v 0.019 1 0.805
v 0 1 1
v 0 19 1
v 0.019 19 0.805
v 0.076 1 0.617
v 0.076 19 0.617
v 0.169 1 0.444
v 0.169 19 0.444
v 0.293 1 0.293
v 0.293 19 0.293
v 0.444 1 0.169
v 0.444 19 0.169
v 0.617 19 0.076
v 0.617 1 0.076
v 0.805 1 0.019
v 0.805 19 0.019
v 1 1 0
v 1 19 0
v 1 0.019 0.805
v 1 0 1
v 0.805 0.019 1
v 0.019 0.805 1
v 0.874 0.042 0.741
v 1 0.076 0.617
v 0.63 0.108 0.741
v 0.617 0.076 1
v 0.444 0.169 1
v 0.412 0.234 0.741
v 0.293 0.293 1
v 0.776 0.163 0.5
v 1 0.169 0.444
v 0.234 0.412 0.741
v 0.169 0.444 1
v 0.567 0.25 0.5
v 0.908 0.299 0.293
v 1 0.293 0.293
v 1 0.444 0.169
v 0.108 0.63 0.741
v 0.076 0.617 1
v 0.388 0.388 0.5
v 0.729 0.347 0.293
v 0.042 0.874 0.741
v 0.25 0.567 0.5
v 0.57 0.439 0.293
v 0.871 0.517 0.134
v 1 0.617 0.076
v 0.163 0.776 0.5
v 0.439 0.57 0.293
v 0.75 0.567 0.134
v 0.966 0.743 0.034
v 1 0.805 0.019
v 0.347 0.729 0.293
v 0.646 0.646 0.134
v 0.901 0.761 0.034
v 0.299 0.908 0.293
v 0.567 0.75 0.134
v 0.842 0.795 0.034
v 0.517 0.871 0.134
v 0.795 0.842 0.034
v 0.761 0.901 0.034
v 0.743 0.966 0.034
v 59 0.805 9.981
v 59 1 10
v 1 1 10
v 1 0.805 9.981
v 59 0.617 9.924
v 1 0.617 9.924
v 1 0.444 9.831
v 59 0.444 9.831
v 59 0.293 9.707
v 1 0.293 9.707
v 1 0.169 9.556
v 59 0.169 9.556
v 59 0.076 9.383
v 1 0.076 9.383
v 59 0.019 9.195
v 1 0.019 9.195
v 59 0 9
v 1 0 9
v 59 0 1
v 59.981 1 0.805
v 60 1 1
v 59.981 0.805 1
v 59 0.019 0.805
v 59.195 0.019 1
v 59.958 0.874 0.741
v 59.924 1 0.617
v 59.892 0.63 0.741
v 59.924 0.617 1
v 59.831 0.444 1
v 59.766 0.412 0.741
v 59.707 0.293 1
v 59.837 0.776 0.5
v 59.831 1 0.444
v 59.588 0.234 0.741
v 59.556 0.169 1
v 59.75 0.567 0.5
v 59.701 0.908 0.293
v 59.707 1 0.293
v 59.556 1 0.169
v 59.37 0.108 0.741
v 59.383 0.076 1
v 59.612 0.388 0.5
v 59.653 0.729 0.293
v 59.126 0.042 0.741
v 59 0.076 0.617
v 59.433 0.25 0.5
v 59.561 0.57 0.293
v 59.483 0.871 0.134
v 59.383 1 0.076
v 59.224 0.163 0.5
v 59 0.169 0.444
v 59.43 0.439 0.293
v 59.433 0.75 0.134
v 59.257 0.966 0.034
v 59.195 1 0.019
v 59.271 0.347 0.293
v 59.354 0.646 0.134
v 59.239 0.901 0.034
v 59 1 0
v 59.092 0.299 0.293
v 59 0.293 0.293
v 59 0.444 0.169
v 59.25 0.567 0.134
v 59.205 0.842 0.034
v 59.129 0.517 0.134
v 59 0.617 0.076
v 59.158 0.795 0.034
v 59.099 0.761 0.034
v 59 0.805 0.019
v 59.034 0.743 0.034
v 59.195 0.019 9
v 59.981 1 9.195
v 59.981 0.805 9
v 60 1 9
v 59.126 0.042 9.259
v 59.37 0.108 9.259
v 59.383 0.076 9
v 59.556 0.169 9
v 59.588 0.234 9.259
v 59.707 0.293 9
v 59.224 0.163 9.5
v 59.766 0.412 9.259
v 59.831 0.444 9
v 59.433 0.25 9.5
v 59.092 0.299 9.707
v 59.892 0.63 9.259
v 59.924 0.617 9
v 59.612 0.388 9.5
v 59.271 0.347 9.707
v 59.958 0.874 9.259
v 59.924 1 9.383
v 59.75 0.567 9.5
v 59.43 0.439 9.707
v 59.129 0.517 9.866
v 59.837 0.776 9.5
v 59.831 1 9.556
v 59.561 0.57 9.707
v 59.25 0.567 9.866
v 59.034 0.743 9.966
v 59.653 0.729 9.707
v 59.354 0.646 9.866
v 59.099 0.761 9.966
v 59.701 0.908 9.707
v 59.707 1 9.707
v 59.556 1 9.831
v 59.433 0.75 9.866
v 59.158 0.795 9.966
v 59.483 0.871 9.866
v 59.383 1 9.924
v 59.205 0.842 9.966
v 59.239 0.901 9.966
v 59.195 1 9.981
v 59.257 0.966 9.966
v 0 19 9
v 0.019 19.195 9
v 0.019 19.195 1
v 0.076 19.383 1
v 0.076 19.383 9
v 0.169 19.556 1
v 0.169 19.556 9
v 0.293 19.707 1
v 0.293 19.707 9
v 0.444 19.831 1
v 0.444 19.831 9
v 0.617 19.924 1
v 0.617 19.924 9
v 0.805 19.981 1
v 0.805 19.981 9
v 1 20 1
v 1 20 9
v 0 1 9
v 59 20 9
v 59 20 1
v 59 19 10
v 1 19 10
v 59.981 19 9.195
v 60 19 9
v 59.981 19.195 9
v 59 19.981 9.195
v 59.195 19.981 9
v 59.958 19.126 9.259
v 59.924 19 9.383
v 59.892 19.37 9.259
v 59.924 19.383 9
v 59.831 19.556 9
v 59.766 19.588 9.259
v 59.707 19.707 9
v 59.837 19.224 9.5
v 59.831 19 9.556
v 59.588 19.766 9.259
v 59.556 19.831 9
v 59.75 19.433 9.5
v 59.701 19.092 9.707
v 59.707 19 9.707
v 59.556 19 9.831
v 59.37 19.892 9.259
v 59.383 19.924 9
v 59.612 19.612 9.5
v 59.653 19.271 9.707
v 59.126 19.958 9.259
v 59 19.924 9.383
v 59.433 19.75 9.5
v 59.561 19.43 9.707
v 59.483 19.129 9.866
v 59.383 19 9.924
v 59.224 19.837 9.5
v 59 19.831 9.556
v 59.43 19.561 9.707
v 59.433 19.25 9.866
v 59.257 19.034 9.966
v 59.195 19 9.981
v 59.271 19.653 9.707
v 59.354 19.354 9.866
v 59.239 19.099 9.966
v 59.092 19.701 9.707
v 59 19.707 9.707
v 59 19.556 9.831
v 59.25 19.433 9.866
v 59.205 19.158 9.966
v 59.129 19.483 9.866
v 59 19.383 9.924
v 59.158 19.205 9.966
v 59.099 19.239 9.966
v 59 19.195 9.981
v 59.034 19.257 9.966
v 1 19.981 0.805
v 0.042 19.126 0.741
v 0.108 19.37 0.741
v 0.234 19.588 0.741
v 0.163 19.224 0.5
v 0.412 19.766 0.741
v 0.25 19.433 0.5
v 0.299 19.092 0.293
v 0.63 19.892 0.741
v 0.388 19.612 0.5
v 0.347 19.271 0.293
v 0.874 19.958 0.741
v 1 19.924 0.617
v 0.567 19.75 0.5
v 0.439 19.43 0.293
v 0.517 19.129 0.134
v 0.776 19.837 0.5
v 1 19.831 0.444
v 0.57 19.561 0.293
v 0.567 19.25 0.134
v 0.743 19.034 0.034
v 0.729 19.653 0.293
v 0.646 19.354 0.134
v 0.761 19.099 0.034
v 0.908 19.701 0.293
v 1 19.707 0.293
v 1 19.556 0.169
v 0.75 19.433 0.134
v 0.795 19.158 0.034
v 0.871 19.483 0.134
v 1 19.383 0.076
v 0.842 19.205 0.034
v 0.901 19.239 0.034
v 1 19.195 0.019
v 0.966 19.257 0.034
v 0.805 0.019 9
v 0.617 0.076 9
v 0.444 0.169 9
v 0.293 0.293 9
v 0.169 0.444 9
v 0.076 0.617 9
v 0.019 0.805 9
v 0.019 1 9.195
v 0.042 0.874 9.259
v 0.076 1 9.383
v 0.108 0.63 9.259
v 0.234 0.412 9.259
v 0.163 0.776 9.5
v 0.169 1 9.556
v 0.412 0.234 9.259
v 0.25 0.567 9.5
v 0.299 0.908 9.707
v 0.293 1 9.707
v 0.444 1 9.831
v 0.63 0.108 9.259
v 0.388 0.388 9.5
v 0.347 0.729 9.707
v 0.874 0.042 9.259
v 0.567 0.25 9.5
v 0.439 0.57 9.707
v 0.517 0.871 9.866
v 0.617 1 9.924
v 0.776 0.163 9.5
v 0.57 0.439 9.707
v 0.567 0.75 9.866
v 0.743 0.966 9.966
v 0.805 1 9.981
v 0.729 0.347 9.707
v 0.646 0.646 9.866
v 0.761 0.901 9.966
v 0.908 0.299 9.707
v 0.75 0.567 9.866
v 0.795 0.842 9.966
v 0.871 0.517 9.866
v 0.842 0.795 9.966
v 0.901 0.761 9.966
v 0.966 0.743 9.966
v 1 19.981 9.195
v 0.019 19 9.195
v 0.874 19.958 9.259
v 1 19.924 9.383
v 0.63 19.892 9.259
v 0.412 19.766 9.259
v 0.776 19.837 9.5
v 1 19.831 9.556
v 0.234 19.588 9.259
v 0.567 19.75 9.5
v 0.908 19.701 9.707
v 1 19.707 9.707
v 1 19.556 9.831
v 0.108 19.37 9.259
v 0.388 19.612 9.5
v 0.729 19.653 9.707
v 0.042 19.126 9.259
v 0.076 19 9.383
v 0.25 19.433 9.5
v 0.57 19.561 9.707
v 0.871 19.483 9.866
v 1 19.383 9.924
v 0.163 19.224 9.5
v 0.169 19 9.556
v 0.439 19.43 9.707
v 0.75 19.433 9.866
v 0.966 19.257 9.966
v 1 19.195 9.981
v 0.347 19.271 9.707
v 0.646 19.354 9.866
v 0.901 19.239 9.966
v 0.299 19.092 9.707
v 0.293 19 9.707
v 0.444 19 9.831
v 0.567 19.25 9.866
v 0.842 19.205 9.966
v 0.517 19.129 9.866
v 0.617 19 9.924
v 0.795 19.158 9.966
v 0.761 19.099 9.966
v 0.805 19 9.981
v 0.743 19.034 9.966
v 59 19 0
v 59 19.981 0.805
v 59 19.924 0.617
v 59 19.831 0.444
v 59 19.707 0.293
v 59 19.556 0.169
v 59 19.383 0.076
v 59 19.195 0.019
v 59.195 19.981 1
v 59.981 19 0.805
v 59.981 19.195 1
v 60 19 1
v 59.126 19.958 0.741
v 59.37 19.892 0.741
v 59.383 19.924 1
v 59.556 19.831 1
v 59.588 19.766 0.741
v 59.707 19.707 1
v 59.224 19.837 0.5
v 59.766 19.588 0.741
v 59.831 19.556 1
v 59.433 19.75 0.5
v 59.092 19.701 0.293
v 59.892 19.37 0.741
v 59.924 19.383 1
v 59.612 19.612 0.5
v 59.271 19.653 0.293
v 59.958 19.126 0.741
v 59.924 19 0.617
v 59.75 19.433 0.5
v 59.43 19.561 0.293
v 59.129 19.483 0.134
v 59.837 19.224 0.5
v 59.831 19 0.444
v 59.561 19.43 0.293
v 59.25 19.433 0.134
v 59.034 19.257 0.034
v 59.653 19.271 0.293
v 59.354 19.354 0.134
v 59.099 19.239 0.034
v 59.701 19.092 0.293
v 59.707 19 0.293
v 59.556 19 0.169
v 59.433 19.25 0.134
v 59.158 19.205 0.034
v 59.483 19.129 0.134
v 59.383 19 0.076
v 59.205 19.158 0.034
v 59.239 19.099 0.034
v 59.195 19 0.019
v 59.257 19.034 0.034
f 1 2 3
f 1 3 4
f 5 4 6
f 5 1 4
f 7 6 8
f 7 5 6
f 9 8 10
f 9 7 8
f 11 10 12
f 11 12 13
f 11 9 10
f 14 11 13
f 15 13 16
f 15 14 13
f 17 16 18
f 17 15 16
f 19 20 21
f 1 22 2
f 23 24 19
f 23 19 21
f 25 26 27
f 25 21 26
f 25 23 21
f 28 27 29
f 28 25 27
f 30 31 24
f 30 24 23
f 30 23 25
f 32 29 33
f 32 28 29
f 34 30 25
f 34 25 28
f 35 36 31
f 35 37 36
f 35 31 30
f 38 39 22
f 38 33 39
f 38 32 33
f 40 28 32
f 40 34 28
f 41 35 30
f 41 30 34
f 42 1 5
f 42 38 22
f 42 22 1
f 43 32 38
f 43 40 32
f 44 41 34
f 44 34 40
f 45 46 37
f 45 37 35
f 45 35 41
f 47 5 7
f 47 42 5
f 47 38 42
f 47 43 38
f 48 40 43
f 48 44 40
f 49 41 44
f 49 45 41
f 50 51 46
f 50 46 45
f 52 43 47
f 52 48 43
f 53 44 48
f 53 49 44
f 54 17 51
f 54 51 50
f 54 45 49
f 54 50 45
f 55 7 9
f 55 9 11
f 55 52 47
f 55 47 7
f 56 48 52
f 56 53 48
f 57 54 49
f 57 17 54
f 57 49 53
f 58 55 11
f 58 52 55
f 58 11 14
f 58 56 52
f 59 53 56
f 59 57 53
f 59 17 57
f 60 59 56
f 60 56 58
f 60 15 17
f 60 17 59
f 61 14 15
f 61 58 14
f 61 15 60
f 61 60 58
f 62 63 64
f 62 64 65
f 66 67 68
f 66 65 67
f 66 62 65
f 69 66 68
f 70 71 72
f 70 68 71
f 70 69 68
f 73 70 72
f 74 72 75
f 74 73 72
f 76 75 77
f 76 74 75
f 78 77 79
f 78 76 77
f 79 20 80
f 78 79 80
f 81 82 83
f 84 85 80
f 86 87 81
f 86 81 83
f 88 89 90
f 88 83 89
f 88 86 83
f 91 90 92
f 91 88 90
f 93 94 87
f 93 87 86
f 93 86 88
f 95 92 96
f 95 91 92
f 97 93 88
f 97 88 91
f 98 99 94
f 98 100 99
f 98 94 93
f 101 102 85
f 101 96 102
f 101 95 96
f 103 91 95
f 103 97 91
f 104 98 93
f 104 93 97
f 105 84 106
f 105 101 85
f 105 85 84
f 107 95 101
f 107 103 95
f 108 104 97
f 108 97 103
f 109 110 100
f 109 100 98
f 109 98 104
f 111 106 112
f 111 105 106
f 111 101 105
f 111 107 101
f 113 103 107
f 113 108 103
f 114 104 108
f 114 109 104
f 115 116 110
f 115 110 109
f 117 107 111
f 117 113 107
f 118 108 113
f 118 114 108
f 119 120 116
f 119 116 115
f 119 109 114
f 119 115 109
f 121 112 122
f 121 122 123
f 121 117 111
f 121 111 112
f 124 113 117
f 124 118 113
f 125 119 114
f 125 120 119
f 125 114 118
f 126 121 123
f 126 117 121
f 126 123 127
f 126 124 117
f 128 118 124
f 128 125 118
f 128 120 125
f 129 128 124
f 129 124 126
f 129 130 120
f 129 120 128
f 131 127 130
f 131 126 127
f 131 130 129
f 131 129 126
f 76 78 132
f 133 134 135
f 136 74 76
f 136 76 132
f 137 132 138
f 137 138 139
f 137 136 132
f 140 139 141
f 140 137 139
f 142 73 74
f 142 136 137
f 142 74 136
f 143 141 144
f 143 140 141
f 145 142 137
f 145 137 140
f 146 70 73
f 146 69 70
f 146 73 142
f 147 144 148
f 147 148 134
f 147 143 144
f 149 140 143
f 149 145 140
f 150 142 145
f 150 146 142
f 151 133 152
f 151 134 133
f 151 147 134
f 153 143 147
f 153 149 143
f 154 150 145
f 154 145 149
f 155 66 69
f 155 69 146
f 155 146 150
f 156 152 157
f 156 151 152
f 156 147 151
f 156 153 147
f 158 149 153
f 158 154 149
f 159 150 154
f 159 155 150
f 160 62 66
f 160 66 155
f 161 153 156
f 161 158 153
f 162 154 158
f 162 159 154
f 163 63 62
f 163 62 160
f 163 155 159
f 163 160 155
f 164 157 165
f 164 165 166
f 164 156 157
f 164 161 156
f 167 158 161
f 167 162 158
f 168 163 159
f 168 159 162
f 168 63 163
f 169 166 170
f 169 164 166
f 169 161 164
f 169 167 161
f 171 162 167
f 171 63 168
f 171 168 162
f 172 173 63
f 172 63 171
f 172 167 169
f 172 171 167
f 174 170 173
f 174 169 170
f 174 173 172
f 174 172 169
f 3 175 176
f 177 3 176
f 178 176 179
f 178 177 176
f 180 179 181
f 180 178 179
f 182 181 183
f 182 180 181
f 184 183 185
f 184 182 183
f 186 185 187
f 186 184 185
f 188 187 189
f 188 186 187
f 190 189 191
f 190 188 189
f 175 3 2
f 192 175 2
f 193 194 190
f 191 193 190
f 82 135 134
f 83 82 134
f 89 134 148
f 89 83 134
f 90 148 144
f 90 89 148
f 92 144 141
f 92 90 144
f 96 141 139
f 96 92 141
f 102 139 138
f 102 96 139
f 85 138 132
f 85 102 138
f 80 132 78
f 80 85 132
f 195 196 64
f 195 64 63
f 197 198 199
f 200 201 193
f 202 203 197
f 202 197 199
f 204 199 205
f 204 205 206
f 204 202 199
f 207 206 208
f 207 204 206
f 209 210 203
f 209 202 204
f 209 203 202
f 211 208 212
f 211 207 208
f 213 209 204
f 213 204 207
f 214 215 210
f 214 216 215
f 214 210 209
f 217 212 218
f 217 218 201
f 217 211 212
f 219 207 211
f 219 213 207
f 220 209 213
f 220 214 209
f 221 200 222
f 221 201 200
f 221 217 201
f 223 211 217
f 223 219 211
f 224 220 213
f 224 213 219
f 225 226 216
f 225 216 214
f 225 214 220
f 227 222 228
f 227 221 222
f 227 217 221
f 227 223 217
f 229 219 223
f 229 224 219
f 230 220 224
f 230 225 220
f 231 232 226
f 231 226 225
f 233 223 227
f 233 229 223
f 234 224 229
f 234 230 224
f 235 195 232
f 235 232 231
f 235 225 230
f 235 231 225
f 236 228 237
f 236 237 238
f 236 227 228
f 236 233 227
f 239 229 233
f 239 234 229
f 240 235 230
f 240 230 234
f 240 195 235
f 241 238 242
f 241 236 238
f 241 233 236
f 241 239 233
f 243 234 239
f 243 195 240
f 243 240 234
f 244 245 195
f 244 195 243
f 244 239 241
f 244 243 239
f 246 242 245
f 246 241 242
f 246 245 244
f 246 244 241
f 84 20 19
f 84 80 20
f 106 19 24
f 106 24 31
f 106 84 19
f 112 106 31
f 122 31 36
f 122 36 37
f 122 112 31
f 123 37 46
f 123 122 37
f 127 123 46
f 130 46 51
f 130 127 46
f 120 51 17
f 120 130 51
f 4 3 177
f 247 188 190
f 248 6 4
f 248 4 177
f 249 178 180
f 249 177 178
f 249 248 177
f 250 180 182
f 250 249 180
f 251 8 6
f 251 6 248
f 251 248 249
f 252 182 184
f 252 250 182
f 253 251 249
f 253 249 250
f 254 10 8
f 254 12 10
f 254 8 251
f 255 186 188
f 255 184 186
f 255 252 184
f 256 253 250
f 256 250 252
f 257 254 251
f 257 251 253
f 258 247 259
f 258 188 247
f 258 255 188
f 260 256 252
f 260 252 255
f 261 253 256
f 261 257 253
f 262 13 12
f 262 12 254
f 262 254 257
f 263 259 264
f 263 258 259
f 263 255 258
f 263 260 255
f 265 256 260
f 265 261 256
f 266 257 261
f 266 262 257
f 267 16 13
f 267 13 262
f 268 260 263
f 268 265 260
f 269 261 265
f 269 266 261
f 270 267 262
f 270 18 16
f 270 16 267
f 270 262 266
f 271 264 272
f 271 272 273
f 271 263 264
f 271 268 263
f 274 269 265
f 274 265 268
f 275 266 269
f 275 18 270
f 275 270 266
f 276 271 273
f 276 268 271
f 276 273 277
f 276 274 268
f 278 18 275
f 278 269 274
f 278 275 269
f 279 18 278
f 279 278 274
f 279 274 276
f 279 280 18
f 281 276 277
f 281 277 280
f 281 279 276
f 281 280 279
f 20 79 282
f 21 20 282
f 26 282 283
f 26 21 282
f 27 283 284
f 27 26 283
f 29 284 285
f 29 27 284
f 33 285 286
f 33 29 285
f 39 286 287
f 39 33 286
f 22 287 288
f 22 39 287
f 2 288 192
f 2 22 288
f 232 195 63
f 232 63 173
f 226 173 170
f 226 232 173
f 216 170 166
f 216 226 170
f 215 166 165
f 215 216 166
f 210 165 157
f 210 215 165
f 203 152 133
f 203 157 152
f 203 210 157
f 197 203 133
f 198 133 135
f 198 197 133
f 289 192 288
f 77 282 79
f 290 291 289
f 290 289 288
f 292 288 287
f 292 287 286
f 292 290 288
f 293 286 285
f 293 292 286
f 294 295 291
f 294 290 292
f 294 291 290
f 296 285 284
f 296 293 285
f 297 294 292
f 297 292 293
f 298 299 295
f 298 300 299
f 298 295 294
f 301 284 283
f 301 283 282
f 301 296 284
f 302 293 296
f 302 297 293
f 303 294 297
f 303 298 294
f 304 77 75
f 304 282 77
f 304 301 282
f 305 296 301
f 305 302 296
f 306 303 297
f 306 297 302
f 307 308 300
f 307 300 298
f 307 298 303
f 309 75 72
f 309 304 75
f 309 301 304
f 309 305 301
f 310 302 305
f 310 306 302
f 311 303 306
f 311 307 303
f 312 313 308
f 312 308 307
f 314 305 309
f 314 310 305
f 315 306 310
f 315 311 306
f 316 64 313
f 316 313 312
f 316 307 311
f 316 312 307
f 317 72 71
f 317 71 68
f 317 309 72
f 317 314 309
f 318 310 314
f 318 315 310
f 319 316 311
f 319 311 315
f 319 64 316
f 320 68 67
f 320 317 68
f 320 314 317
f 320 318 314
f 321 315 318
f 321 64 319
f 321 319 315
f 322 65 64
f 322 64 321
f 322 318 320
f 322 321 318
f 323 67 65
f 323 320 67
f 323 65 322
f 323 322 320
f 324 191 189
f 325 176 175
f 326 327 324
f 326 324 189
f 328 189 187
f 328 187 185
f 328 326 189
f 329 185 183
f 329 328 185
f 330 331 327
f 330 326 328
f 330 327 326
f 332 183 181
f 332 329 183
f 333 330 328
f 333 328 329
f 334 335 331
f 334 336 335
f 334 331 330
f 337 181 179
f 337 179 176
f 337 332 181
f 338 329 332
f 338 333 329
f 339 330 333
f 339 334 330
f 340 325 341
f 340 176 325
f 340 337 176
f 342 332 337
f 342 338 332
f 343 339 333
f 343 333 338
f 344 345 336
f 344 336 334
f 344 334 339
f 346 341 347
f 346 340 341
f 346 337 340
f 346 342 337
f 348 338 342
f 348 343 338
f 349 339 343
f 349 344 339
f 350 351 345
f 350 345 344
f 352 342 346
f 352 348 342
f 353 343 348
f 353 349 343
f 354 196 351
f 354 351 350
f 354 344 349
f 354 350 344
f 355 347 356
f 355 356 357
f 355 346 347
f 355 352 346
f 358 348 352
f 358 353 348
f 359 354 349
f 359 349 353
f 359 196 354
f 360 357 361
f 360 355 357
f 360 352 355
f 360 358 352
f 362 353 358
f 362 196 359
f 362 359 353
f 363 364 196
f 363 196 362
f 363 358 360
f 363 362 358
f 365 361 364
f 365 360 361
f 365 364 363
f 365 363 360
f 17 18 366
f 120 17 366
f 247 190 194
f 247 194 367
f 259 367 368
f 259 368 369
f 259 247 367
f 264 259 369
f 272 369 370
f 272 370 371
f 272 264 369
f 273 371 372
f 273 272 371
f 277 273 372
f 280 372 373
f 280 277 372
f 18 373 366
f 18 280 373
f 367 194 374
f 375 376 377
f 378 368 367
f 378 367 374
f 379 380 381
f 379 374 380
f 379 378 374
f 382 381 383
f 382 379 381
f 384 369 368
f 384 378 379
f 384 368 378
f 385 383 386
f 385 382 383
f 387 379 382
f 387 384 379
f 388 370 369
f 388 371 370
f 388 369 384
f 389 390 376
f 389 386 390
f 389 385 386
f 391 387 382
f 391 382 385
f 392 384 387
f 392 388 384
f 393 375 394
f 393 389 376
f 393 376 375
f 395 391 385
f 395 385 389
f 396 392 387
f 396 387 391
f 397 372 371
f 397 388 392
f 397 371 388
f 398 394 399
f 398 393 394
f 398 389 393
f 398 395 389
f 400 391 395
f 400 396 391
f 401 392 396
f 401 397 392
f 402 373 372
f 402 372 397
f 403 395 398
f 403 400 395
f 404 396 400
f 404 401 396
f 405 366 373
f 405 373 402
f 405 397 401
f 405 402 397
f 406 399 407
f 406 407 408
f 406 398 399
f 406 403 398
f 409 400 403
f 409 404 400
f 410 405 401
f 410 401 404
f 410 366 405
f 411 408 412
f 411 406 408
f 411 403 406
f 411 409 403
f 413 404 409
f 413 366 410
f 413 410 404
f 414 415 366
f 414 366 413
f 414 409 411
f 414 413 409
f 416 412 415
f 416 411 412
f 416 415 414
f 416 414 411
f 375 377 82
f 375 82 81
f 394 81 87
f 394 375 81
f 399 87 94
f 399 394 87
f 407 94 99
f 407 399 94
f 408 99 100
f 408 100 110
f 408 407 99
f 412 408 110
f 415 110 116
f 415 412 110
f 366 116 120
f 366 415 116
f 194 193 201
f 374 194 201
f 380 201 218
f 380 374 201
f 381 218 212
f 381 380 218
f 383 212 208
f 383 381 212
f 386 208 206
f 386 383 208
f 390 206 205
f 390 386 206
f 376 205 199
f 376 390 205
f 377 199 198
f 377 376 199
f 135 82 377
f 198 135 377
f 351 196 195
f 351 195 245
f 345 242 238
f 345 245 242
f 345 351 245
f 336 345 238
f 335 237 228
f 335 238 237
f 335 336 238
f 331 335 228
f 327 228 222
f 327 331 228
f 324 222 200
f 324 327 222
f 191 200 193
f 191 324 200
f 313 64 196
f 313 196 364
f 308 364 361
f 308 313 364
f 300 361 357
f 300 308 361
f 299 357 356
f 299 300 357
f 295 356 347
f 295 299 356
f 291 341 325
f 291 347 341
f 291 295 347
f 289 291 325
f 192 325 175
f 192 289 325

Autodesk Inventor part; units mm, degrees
ref_plane "YZ Plane" through (0, 0, 0) normal (1, 0, 0) x (0, 1, 0)
ref_plane "XZ Plane" through (0, 0, 0) normal (0, 1, 0) x (-1, 0, 0)
ref_plane "XY Plane" through (0, 0, 0) normal (0, 0, 1) x (1, 0, 0)
sketch "Эскиз1" plane through (0, 0, 0) normal (0, 0, 1) x (1, 0, 0)
  line L0 (1, 0) -> (59, 0)
  line L1 (60, 1) -> (60, 19)
  line L2 (59, 20) -> (1, 20)
  line L3 (0, 19) -> (0, 1)
  arc A0 (1, 20) -> (0, 19) centre (1, 19) ccw
  arc A1 (59, 0) -> (60, 1) centre (59, 1) ccw
  arc A2 (60, 19) -> (59, 20) centre (59, 19) ccw
  arc A3 (0, 1) -> (1, 0) centre (1, 1) ccw
  point P0 (0, 0)
  point P1 (60, 20)
  point P2 (60, 0)
  point P3 (0, 20)
  dimension "d0" = 60
  dimension "d1" = 20
  dimension "d2" = 1
  dimension "d3" = 1
extrude "Выдавливание1" add sketch "Эскиз1" along normal blind 10
fillet "Сопряжение1" radius 1 16 edges at (0.2929, 19.7071, 10) (0, 10, 10) (0.2929, 0.2929, 10) (30, 0, 10) (59.7071, 0.2929, 10) (60, 10, 10) (59.7071, 19.7071, 10) (30, 20, 10) (59.7071, 19.7071, 0) (30, 20, 0) (0.2929, 19.7071, 0) (0, 10, 0) (0.2929, 0.2929, 0) (30, 0, 0) (59.7071, 0.2929, 0) (60, 10, 0)
properties part number "NS"
